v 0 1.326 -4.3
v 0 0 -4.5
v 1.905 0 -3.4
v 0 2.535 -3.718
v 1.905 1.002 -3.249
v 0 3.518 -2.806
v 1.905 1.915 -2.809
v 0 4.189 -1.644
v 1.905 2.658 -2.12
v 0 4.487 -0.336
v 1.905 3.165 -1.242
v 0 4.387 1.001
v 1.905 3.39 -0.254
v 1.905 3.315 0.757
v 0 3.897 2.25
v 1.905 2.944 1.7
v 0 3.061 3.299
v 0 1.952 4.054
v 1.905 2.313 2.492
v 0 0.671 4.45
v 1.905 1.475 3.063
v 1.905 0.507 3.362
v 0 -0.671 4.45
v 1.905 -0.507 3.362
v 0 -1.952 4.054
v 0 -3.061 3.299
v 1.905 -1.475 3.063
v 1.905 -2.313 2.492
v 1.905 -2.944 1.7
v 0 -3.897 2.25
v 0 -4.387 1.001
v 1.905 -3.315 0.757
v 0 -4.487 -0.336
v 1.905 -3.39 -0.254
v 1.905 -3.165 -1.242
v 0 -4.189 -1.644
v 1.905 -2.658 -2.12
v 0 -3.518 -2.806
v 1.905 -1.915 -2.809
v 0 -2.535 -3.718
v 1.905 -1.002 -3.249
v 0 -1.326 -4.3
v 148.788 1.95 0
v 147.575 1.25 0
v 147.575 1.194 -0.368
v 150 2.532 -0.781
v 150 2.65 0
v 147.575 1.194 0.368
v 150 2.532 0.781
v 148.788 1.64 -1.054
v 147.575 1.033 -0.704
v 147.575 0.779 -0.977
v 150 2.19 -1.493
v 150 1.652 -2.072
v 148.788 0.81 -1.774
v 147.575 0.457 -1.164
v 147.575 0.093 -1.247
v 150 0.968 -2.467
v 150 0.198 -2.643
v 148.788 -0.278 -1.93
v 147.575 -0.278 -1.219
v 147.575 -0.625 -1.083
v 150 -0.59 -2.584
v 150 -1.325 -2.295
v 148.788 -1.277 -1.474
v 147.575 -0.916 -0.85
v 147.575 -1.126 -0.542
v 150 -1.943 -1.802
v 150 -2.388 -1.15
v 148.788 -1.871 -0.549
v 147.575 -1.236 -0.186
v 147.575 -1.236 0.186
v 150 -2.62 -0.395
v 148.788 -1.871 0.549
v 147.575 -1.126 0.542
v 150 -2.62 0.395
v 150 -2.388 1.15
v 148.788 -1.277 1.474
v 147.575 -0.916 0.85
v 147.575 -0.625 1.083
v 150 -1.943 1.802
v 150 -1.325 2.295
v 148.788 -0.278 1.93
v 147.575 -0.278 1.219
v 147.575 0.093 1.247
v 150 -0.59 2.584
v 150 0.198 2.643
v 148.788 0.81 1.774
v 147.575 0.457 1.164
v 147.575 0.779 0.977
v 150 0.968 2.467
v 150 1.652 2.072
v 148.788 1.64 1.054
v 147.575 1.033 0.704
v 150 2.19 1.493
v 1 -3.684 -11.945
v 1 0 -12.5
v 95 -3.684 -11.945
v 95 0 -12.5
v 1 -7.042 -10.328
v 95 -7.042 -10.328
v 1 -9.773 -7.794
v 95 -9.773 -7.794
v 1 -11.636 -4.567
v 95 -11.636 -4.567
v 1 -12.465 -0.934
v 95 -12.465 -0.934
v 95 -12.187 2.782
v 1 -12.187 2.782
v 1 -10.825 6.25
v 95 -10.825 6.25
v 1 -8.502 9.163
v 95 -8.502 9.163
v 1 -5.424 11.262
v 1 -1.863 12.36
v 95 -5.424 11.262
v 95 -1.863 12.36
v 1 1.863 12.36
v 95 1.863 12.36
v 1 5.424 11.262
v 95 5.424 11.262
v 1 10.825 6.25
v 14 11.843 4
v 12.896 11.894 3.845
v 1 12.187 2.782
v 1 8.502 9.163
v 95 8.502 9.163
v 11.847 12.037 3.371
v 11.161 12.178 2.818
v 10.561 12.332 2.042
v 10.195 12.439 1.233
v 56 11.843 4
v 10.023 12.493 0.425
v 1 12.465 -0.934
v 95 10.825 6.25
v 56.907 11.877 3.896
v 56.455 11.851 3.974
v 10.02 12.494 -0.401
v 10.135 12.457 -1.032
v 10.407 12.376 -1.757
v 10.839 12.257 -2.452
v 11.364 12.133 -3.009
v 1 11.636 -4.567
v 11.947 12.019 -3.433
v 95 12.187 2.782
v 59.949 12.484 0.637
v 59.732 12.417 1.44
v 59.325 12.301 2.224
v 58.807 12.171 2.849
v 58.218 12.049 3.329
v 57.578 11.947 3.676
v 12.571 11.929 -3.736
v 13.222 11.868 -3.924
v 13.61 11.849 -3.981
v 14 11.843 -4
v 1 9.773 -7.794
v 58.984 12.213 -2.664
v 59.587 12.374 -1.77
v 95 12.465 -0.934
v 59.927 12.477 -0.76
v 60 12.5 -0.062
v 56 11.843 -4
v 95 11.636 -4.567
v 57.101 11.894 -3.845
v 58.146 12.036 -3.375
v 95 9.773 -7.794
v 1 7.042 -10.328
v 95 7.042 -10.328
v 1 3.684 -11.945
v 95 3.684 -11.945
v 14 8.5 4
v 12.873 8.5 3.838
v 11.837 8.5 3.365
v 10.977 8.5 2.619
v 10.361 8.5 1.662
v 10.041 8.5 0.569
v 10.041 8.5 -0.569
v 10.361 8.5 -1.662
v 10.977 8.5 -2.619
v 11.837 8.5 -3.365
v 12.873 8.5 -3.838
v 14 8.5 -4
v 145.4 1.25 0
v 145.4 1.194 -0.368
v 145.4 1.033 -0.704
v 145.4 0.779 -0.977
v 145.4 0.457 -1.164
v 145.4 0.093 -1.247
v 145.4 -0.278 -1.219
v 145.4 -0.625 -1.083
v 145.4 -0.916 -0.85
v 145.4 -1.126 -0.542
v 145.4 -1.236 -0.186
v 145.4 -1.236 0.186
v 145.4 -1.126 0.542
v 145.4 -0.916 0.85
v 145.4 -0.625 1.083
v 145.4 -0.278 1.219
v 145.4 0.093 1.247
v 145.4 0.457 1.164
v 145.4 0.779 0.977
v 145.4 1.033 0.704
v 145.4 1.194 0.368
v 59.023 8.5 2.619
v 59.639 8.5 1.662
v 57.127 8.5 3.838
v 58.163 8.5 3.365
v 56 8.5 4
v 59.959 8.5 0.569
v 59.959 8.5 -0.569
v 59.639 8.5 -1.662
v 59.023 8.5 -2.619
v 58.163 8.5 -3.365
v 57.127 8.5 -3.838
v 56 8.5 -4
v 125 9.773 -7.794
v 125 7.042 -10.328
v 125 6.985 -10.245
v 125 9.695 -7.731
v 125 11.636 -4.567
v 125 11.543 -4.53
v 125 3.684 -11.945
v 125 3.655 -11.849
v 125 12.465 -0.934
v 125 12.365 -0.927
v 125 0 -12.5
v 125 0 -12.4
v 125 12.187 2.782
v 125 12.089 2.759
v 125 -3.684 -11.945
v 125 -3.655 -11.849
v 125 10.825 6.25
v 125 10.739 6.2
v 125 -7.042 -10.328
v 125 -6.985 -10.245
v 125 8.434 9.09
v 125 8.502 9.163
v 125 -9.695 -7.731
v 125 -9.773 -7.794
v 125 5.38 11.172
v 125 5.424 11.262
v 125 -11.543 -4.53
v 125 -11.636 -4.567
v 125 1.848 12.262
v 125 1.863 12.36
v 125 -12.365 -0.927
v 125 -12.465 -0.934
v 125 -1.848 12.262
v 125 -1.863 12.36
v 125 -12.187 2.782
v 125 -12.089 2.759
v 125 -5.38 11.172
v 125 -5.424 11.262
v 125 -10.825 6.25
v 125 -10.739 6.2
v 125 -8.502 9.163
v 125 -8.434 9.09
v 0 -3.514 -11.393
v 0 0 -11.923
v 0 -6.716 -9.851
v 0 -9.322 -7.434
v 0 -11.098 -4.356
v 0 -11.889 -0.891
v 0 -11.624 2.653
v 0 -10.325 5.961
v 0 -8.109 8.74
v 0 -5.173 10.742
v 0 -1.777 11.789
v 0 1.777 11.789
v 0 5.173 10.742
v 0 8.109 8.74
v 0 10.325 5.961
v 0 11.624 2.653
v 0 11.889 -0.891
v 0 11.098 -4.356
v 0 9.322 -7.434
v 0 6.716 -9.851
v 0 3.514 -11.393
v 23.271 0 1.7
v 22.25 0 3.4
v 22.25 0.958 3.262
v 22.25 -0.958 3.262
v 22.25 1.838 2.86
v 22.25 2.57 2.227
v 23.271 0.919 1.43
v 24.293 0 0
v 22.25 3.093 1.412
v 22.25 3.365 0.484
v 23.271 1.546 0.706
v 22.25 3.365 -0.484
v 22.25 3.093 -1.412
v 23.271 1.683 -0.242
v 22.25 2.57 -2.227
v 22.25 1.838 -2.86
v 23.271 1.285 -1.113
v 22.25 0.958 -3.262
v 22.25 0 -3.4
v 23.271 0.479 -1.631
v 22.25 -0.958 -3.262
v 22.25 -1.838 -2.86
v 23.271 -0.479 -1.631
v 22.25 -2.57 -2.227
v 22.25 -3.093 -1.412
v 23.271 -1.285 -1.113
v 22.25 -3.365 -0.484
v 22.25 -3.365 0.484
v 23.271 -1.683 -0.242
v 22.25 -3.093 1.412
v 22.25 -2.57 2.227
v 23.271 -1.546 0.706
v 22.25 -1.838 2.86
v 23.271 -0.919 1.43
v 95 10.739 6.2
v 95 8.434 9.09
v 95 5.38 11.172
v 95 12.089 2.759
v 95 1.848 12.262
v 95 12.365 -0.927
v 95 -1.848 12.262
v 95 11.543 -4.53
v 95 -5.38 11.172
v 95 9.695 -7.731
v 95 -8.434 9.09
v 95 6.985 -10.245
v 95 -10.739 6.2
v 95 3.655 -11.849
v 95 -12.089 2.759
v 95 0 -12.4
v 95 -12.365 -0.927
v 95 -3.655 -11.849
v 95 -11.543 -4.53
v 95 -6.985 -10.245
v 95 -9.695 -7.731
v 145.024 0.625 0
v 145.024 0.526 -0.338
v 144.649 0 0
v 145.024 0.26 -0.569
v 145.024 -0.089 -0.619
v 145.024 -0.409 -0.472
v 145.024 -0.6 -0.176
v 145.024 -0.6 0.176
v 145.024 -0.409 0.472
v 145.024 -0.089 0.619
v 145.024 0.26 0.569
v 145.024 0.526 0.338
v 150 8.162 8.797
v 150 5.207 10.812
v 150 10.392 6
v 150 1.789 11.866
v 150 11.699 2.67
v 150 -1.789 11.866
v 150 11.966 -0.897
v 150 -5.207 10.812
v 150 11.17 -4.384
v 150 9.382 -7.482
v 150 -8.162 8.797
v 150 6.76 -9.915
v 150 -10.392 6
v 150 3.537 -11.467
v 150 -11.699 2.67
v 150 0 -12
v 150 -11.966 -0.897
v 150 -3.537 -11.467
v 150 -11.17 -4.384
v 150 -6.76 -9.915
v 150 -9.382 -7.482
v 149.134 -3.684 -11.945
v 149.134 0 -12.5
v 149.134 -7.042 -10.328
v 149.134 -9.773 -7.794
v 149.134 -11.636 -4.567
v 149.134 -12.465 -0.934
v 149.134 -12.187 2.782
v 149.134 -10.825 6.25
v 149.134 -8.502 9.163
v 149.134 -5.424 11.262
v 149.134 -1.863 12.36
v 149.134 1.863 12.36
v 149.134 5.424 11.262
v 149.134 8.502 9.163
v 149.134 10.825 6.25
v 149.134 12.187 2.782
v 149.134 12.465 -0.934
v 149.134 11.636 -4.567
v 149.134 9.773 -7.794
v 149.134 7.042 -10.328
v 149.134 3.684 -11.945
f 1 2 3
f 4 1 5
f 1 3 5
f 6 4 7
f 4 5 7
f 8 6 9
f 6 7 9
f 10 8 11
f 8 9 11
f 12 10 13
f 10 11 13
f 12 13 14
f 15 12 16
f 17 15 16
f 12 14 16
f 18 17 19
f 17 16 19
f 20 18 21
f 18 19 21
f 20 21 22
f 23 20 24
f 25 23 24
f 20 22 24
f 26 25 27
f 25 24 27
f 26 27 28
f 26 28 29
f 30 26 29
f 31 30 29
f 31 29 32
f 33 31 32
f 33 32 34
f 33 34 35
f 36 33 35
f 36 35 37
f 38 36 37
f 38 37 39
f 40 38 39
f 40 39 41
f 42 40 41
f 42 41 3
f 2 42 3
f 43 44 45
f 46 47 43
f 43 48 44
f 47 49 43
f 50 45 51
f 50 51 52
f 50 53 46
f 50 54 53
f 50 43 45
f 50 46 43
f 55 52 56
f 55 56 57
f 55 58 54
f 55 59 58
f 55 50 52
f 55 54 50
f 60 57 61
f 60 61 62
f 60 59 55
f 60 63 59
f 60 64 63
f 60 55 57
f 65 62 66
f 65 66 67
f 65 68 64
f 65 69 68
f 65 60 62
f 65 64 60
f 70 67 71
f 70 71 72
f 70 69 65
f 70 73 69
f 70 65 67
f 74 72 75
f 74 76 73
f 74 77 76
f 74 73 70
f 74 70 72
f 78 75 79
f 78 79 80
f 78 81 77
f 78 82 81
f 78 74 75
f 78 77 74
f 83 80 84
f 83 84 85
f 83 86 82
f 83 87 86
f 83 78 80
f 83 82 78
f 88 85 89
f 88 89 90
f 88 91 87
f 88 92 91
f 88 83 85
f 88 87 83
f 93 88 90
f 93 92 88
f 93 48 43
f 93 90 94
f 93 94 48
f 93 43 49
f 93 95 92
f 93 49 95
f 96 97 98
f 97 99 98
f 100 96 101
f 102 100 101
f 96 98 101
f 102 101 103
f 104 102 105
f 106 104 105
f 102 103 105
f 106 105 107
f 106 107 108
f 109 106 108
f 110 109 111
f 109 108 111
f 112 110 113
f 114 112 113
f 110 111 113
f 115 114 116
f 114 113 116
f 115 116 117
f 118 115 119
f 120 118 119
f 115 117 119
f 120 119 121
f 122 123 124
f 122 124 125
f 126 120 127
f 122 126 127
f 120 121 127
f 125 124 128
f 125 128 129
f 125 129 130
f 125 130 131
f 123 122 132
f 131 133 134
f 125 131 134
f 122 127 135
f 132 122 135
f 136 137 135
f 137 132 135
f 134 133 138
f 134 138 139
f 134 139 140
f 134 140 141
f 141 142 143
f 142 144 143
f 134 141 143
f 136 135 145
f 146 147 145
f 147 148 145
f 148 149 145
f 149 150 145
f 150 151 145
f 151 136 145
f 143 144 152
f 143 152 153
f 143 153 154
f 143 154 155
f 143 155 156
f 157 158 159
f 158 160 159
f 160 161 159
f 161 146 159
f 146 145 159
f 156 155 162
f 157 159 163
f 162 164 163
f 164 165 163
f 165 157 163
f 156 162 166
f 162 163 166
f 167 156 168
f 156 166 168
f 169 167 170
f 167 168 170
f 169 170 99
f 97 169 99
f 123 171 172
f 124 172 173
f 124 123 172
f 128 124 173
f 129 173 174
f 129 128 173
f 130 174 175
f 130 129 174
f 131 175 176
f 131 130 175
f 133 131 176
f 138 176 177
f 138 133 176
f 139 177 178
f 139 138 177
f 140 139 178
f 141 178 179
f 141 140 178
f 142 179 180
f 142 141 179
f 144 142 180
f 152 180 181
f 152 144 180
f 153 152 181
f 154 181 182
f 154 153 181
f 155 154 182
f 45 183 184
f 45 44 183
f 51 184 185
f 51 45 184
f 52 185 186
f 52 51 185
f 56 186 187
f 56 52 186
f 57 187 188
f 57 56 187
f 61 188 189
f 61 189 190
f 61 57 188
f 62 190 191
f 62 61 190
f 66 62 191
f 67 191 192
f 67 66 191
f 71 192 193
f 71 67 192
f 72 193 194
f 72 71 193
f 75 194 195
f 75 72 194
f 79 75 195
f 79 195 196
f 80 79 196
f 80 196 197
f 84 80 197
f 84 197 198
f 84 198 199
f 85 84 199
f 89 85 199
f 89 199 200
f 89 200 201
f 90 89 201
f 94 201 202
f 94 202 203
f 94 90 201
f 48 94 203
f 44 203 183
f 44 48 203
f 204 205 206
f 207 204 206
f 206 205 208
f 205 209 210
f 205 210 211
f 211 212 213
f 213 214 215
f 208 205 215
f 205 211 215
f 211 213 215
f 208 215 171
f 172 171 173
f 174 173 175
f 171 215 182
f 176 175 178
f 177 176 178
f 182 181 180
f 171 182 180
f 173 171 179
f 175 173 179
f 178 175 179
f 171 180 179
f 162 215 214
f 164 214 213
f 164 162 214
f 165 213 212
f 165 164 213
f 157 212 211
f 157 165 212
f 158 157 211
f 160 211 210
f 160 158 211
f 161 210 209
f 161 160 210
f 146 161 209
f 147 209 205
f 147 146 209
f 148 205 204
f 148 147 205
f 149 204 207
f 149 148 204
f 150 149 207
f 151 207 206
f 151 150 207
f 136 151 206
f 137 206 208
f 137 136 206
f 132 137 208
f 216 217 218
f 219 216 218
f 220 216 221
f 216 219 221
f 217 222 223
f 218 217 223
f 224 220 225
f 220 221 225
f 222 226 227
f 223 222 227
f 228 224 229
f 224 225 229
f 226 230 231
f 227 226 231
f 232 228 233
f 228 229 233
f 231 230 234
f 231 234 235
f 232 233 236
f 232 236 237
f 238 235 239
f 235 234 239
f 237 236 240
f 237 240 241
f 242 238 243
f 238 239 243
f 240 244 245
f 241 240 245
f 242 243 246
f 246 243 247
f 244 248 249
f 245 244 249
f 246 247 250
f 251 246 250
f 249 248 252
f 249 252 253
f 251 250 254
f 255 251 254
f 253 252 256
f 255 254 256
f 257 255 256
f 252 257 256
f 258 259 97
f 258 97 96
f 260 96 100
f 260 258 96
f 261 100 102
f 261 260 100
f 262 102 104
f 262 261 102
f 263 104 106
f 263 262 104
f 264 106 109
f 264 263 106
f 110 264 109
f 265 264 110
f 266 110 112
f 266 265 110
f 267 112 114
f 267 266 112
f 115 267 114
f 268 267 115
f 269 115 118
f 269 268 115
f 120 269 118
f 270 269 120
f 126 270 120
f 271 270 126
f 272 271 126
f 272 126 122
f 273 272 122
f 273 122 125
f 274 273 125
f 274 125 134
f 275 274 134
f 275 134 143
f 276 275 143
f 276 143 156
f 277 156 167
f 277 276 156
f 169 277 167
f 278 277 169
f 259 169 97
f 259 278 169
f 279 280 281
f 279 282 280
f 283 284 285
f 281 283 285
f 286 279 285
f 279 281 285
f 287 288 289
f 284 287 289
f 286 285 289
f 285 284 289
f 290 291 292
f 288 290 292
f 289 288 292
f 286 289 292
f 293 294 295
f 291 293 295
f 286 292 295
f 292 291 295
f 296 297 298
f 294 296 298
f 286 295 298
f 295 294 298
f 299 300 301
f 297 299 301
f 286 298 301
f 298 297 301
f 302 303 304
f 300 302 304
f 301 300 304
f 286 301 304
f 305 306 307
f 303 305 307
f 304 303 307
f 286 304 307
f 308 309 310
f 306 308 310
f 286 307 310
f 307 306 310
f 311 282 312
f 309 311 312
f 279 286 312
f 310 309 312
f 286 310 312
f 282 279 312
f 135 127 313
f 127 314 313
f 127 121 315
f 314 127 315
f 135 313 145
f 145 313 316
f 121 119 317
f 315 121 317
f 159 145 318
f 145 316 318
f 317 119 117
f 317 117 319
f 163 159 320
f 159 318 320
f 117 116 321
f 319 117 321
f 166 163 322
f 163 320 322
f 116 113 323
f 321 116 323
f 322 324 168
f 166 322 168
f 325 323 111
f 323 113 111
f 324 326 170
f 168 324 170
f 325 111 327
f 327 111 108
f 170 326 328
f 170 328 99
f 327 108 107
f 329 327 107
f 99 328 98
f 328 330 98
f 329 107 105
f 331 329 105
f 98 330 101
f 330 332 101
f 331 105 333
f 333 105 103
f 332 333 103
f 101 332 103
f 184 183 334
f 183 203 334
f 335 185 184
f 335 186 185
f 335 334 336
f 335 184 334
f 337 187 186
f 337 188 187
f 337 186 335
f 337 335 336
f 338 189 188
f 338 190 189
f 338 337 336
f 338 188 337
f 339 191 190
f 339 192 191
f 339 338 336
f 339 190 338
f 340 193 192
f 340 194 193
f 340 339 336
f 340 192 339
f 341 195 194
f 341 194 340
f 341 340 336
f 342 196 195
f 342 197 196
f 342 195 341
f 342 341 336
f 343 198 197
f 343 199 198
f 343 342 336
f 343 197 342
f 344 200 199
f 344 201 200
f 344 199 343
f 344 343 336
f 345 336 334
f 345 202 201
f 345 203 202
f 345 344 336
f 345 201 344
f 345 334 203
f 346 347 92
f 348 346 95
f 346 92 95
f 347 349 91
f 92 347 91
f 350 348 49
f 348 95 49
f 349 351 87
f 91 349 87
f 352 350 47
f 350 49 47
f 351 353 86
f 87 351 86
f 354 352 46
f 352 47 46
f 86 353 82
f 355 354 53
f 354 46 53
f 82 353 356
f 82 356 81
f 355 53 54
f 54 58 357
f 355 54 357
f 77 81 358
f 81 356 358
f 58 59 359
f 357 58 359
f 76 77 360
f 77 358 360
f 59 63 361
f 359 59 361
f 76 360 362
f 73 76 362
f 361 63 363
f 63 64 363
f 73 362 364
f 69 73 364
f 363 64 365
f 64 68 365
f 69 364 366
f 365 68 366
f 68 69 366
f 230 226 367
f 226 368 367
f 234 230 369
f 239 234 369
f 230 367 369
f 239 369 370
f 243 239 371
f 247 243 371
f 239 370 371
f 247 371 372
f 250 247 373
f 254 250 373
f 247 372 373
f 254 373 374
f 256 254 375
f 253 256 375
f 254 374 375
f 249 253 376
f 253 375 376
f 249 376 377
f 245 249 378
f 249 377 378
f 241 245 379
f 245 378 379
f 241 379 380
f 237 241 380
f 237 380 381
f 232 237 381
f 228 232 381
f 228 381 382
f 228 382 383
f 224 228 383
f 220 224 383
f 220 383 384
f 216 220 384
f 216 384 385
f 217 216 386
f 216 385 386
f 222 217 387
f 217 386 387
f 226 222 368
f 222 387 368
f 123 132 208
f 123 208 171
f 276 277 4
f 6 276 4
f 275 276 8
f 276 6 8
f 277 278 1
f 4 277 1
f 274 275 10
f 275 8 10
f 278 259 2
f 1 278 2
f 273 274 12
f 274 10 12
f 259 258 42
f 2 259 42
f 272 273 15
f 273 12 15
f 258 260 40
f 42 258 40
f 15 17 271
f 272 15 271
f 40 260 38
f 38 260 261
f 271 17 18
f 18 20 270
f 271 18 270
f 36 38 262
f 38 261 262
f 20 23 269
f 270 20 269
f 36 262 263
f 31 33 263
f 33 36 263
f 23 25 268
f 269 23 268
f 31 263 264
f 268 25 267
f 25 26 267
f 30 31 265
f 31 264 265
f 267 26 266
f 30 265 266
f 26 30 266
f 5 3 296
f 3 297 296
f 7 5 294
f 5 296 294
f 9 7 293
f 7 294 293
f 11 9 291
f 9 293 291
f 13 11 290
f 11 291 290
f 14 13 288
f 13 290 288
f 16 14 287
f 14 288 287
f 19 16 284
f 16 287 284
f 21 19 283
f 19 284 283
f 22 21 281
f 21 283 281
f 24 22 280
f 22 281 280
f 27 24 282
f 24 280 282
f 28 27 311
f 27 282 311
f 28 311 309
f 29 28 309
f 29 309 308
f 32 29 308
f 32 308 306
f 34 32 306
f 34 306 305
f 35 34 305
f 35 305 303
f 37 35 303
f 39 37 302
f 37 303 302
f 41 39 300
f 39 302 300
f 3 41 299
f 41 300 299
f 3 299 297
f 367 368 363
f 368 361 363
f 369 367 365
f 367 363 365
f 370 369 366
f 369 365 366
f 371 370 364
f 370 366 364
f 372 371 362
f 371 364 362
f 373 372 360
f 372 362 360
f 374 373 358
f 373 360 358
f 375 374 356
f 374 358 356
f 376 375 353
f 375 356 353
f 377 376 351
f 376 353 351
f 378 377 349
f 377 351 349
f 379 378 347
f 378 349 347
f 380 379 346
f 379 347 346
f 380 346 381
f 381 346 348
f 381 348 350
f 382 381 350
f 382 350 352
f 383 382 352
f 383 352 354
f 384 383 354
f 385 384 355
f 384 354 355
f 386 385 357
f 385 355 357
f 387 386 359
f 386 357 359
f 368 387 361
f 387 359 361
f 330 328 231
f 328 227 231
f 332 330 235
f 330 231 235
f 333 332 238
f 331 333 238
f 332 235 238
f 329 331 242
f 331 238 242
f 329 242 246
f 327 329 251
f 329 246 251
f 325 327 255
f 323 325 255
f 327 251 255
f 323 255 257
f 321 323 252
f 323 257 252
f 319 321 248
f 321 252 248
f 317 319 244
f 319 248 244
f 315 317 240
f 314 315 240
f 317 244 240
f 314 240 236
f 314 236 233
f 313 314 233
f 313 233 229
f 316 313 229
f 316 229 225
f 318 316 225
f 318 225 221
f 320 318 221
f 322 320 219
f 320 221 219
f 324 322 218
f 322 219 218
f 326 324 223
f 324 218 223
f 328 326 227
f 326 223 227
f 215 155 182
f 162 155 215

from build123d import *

# Parameters (mm, degrees)
M8_GEWINDEBOHRUNG1_D            = 6.8
M8_GEWINDEBOHRUNG1_DEPTH        = 22.25
M8_GEWINDEBOHRUNG1_CSINK_D      = 9
M8_GEWINDEBOHRUNG1_CSINK_ANGLE  = 60
M8_GEWINDEBOHRUNG1_TIP          = 2.042926105
FASE1_SIZE                      = 1
FASE1_SIZE2                     = 0.577350269
SCHNITT_LINEAR_AUSTRAGEN1_DEPTH = 4


with BuildPart() as part:
    # Skizze1 → Rotation1 (revolve)
    with BuildSketch(Plane(origin=(0, 0, 0), x_dir=(1, 0, 0), z_dir=(0, 1, 0))):
        Polygon((0, 0), (0, 12.5), (95, 12.5), (95, 12.4), (125, 12.4), (125, 12.5), (149.133974596, 12.5), (150, 12), (150, 0), align=None)
    revolve(axis=Axis((0, 0, 0), (-1, 0, 0)))

    # Skizze3 → Schnitt-Rotation1 (revolve, cut)
    with BuildSketch(Plane(origin=(150, 0, 0), x_dir=(0, 0, -1), z_dir=(0, -1, 0)), mode=Mode.PRIVATE) as schnitt_rotation1_sk:
        Polygon((0, -5.351075774), (1.25, -4.6), (1.25, -2.424871131), (2.65, 0), (0, 0), align=None)
    revolve(schnitt_rotation1_sk.sketch.rotate(Axis((150, 0, 0), (-1, 0, 0)), 270), axis=Axis((150, 0, 0), (-1, 0, 0)), mode=Mode.SUBTRACT)

    # M8 Gewindebohrung1
    with Locations(Plane.ZY):
        with Locations((0, 0)):
            CounterSinkHole(M8_GEWINDEBOHRUNG1_D / 2, M8_GEWINDEBOHRUNG1_CSINK_D / 2, depth=M8_GEWINDEBOHRUNG1_DEPTH, counter_sink_angle=M8_GEWINDEBOHRUNG1_CSINK_ANGLE)
            with Locations((0, 0, -(M8_GEWINDEBOHRUNG1_DEPTH + M8_GEWINDEBOHRUNG1_TIP / 2))):  # 118° drill point
                Cone(0, M8_GEWINDEBOHRUNG1_D / 2, M8_GEWINDEBOHRUNG1_TIP, mode=Mode.SUBTRACT)

    # Fase1
    fase1_edges = [part.edges().sort_by_distance(p)[0] for p in [
        (0, 0, 12.5),
    ]]
    fase1_side = [part.faces().sort_by_distance(p)[0] for p in [
        (47.5, 0, 12.5),
    ]]
    chamfer(fase1_edges, length=FASE1_SIZE, length2=FASE1_SIZE2, reference=fase1_side[0])

    # Skizze2 → Schnitt-Linear austragen1 (cut)
    with BuildSketch(Plane(origin=(0, 12.5, 4.921019115), x_dir=(1, 0, 0), z_dir=(0, 1, 0))):
        with BuildLine():
            Line((14, 8.921019115), (56, 8.921019115))
            ThreePointArc((56, 8.921019115), (60, 4.921019115), (56, 0.921019115))
            Line((56, 0.921019115), (14, 0.921019115))
            ThreePointArc((14, 0.921019115), (10, 4.921019115), (14, 8.921019115))
        make_face()
    extrude(amount=-SCHNITT_LINEAR_AUSTRAGEN1_DEPTH, mode=Mode.SUBTRACT)


solid = part.part
